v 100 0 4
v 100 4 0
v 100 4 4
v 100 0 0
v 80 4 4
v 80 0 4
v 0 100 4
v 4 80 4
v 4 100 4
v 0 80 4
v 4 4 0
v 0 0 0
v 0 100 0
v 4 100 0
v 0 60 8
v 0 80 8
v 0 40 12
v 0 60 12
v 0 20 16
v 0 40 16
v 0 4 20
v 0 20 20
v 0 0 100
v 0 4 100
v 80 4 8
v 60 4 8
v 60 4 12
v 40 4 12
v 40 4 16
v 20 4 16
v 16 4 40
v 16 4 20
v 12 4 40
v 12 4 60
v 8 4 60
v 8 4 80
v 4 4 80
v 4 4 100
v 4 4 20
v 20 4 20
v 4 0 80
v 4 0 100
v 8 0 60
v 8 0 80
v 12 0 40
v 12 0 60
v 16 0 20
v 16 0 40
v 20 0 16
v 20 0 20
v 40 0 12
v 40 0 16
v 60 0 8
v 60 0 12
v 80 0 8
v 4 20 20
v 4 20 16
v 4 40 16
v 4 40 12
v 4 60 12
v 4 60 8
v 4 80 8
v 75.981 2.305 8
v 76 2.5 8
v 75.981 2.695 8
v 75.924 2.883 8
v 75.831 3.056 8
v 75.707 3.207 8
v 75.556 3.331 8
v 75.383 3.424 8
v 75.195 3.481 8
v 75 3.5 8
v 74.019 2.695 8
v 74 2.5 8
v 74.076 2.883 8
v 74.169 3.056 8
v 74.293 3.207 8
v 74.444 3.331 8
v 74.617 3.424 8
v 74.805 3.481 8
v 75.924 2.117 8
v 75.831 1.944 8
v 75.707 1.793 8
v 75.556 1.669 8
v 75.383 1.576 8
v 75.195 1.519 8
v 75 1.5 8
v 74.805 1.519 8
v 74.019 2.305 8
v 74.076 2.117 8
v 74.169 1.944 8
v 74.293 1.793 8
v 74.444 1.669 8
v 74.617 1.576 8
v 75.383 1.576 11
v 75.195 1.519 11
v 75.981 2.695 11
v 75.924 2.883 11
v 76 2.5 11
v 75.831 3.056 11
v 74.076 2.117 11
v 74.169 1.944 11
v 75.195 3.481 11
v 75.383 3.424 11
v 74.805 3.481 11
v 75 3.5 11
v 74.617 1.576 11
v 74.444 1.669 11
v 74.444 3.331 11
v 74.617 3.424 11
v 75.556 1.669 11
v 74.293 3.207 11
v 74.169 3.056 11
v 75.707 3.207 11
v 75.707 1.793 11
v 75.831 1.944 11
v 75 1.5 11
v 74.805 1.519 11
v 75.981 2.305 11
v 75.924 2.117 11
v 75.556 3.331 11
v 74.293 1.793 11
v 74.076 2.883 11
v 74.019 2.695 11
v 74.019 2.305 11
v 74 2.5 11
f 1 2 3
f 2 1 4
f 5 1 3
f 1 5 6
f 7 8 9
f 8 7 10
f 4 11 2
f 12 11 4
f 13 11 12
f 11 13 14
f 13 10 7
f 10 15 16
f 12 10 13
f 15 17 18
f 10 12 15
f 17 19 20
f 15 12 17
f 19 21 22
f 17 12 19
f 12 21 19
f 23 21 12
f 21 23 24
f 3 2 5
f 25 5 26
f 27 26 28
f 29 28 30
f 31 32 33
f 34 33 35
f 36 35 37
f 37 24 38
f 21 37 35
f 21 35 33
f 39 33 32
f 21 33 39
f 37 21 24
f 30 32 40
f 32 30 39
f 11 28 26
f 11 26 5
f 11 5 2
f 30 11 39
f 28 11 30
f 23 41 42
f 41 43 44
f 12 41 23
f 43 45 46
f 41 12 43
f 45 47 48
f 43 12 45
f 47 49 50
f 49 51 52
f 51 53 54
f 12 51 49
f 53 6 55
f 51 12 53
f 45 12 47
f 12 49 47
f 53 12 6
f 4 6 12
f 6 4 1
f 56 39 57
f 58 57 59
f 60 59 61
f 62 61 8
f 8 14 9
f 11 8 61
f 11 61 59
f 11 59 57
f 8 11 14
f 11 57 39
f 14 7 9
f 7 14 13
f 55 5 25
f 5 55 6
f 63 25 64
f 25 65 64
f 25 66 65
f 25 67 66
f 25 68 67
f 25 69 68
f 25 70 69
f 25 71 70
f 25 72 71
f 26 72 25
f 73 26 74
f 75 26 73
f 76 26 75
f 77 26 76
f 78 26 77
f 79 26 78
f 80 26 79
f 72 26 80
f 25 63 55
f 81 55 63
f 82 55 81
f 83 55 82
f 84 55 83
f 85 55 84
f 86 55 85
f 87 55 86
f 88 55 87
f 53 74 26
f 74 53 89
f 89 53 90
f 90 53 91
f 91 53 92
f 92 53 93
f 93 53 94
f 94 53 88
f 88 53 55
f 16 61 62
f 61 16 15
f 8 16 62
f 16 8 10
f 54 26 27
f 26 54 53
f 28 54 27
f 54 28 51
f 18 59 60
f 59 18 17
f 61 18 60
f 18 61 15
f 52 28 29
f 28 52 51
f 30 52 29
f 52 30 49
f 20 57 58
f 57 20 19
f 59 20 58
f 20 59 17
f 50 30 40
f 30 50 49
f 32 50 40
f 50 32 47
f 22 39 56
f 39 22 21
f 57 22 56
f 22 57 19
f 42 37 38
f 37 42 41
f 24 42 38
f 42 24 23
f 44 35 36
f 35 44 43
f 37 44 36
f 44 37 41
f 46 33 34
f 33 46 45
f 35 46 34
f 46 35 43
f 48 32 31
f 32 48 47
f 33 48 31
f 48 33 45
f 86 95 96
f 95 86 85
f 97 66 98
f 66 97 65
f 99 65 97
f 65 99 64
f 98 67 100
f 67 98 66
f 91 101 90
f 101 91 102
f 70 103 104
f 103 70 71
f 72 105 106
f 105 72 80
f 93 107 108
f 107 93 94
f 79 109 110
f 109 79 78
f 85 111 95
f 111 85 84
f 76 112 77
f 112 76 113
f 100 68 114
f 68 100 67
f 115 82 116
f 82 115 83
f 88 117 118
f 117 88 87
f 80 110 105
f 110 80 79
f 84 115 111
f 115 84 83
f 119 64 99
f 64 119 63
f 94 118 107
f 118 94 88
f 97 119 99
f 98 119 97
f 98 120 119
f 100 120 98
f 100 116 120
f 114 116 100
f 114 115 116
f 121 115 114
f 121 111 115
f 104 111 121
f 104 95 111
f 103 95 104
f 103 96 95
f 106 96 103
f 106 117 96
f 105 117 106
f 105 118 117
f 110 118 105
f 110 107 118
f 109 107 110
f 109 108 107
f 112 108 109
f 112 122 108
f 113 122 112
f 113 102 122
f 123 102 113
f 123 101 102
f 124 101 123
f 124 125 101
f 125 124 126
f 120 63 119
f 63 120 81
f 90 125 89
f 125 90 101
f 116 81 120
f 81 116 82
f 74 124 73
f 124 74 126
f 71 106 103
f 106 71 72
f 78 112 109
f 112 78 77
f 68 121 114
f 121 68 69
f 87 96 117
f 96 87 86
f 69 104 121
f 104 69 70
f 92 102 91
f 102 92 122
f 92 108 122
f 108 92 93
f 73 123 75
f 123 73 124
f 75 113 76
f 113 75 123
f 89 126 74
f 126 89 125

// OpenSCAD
for (i = [0 : 4])
{
        translate([0,0, 4 *i]) union()
        {   
            cube([100 - 20 * i, 4, 4]);
            cube([4, 100 - 20 * i, 4]);
        }
        translate([4 * i, 0, 0]) cube([4,4, 100 -20 *i]);
}
translate([75,2.5,8])
cylinder(3, d = 2, $fn =32);
